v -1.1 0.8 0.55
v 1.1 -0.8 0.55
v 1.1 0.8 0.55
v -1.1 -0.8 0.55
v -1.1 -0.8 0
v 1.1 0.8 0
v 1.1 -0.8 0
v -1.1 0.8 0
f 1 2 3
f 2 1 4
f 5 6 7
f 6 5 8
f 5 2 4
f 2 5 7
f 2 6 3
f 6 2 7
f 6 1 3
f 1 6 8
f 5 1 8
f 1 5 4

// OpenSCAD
// The SMD parts on the back of the fascia: the eight 1206 resistors (TS06-FASCIA-rhythm) and the JST PH connector: the
// side-entry S6B-PH-SM4-TB that rev A of the fascia R carried, and the upright (top-entry) B6B-PH-SM4-TB of rev B. Made
// for 3d/populated (KiCad's 3D library has a footprint for neither JST part, and no model: checked in its GitLab tree).
//
// layers: body=#1b1b1d term=#c9c9c9 housing=#e6e1d3 tab=#b8bcc0
// variants: r1206_back MODE=0 ; jst_s6b_sm4_back MODE=1 ; jst_b6b_sm4_back MODE=2
//
// FRAME  KiCad model frame of the footprint as authored: z up from the face the part is soldered to (KiCad flips
//        the model for a back-side footprint, so it stands out of the fascia's rear face).
//
// r1206_back (R1-R8, TS06_R_1206_HandSolder, pads at x +-1.85)
//   body 3.2 x 1.6 x 0.55 mm, end caps 0.5 mm      INFERRED: standard 1206 (3216 metric) chip resistor outline
// jst_s6b_sm4_back (J1, TS06_JST_PH_S6B-PH-SM4-TB_Back; cable exits toward +y)
//   housing x -6.95..6.95, y -3.2..4.4 (13.9 x 7.6)   MEASURED (repo source): the footprint's B.Fab rectangle (15.9 x 7.6, which
//                                                     includes the retention tabs at x +-7.35) less the tabs
//   height 4.8 mm                                    INFERRED: case_pair.py FJ_HDR_H 4.8 (assumed there)
//   mouth (the cable side, +y) drawn as a 6.0 x 2.0 recess is NOT modelled; pins and tabs: tabs 1.5 x 3.4 at (+-7.35, 2.9)
//                                                    MEASURED (footprint pads MP)
// jst_b6b_sm4_back (J1 of rev B, TS06_JST_PH_B6B-PH-SM4-TB_Back; the mouth faces away from the board, the solder tails run to +y)
//   housing x -6.95..6.95 (13.9), footprint y -4.25..0.75 (5.0)   MEASURED (repo source): width = the 13.9 of KiCad's STEP of the through-hole
//                                                    B6B-PH-K (3d/populated/kicad3d, read for this: x 13.9, y 4.55, z 6.0), the same PH plastic body; depth =
//                                                    the SM4-TB footprint's F.Fab outline (x +-7.975 there includes the metal tabs outside the plastic)
//   height 6.0 mm                                    INFERRED: JST's catalogue figure for the PH top-entry headers as remembered, and the 6.0 of that STEP; the
//                                                    SM4-TB datasheet itself was not readable here (jst-mfg.com is blocked by the egress policy)
//   mouth (the shroud's opening) is NOT modelled; tabs 1.6 x 3.0 at (+-7.4, fp y -1.75) and pads 1.0 x 5.5 at fp y 0.5   MEASURED (footprint pads)
MODE = 0;
L = "body";

if (MODE == 0) {
    if (L == "body") translate([-1.1, -0.8, 0]) cube([2.2, 1.6, 0.55]);
    if (L == "term") for (s = [-1, 1]) translate([s * 1.35 - 0.25, -0.8, 0]) cube([0.5, 1.6, 0.6]);
}
if (MODE == 1) {
    // model y is the footprint's y negated: housing B.Fab y -3.2..4.4 -> -4.4..3.2, tabs at fp y +2.9 -> -2.9, signal pads at fp y -2.85 -> +2.85
    if (L == "housing") translate([-6.95, -4.4, 0.05]) cube([13.9, 7.6, 4.8]);
    if (L == "tab") for (s = [-1, 1]) translate([s * 7.35 - 0.75, -2.9 - 1.7, 0]) cube([1.5, 3.4, 0.25]);
    if (L == "term") for (k = [0 : 5]) translate([k * 2.0 - 5.0 - 0.25, 2.85 - 1.75, 0]) cube([0.5, 3.5, 0.2]);
}
if (MODE == 2) {
    // model y is the footprint's y negated: housing fp y -4.25..0.75 -> -0.75..4.25, tabs at fp y -1.75 -> +1.75, signal pads at fp y 0.5 -> -0.5 (they run
    // 2.5 mm out of the body at fp y > 0.75, i.e. model y < -0.75: the solder tails)
    if (L == "housing") translate([-6.95, -0.75, 0.05]) cube([13.9, 5.0, 5.95]);
    if (L == "tab") for (s = [-1, 1]) translate([s * 7.4 - 0.8, 1.75 - 1.5, 0]) cube([1.6, 3.0, 0.25]);
    if (L == "term") for (k = [0 : 5]) translate([k * 2.0 - 5.0 - 0.5, -0.5 - 2.75, 0]) cube([1.0, 5.5, 0.2]);
}
